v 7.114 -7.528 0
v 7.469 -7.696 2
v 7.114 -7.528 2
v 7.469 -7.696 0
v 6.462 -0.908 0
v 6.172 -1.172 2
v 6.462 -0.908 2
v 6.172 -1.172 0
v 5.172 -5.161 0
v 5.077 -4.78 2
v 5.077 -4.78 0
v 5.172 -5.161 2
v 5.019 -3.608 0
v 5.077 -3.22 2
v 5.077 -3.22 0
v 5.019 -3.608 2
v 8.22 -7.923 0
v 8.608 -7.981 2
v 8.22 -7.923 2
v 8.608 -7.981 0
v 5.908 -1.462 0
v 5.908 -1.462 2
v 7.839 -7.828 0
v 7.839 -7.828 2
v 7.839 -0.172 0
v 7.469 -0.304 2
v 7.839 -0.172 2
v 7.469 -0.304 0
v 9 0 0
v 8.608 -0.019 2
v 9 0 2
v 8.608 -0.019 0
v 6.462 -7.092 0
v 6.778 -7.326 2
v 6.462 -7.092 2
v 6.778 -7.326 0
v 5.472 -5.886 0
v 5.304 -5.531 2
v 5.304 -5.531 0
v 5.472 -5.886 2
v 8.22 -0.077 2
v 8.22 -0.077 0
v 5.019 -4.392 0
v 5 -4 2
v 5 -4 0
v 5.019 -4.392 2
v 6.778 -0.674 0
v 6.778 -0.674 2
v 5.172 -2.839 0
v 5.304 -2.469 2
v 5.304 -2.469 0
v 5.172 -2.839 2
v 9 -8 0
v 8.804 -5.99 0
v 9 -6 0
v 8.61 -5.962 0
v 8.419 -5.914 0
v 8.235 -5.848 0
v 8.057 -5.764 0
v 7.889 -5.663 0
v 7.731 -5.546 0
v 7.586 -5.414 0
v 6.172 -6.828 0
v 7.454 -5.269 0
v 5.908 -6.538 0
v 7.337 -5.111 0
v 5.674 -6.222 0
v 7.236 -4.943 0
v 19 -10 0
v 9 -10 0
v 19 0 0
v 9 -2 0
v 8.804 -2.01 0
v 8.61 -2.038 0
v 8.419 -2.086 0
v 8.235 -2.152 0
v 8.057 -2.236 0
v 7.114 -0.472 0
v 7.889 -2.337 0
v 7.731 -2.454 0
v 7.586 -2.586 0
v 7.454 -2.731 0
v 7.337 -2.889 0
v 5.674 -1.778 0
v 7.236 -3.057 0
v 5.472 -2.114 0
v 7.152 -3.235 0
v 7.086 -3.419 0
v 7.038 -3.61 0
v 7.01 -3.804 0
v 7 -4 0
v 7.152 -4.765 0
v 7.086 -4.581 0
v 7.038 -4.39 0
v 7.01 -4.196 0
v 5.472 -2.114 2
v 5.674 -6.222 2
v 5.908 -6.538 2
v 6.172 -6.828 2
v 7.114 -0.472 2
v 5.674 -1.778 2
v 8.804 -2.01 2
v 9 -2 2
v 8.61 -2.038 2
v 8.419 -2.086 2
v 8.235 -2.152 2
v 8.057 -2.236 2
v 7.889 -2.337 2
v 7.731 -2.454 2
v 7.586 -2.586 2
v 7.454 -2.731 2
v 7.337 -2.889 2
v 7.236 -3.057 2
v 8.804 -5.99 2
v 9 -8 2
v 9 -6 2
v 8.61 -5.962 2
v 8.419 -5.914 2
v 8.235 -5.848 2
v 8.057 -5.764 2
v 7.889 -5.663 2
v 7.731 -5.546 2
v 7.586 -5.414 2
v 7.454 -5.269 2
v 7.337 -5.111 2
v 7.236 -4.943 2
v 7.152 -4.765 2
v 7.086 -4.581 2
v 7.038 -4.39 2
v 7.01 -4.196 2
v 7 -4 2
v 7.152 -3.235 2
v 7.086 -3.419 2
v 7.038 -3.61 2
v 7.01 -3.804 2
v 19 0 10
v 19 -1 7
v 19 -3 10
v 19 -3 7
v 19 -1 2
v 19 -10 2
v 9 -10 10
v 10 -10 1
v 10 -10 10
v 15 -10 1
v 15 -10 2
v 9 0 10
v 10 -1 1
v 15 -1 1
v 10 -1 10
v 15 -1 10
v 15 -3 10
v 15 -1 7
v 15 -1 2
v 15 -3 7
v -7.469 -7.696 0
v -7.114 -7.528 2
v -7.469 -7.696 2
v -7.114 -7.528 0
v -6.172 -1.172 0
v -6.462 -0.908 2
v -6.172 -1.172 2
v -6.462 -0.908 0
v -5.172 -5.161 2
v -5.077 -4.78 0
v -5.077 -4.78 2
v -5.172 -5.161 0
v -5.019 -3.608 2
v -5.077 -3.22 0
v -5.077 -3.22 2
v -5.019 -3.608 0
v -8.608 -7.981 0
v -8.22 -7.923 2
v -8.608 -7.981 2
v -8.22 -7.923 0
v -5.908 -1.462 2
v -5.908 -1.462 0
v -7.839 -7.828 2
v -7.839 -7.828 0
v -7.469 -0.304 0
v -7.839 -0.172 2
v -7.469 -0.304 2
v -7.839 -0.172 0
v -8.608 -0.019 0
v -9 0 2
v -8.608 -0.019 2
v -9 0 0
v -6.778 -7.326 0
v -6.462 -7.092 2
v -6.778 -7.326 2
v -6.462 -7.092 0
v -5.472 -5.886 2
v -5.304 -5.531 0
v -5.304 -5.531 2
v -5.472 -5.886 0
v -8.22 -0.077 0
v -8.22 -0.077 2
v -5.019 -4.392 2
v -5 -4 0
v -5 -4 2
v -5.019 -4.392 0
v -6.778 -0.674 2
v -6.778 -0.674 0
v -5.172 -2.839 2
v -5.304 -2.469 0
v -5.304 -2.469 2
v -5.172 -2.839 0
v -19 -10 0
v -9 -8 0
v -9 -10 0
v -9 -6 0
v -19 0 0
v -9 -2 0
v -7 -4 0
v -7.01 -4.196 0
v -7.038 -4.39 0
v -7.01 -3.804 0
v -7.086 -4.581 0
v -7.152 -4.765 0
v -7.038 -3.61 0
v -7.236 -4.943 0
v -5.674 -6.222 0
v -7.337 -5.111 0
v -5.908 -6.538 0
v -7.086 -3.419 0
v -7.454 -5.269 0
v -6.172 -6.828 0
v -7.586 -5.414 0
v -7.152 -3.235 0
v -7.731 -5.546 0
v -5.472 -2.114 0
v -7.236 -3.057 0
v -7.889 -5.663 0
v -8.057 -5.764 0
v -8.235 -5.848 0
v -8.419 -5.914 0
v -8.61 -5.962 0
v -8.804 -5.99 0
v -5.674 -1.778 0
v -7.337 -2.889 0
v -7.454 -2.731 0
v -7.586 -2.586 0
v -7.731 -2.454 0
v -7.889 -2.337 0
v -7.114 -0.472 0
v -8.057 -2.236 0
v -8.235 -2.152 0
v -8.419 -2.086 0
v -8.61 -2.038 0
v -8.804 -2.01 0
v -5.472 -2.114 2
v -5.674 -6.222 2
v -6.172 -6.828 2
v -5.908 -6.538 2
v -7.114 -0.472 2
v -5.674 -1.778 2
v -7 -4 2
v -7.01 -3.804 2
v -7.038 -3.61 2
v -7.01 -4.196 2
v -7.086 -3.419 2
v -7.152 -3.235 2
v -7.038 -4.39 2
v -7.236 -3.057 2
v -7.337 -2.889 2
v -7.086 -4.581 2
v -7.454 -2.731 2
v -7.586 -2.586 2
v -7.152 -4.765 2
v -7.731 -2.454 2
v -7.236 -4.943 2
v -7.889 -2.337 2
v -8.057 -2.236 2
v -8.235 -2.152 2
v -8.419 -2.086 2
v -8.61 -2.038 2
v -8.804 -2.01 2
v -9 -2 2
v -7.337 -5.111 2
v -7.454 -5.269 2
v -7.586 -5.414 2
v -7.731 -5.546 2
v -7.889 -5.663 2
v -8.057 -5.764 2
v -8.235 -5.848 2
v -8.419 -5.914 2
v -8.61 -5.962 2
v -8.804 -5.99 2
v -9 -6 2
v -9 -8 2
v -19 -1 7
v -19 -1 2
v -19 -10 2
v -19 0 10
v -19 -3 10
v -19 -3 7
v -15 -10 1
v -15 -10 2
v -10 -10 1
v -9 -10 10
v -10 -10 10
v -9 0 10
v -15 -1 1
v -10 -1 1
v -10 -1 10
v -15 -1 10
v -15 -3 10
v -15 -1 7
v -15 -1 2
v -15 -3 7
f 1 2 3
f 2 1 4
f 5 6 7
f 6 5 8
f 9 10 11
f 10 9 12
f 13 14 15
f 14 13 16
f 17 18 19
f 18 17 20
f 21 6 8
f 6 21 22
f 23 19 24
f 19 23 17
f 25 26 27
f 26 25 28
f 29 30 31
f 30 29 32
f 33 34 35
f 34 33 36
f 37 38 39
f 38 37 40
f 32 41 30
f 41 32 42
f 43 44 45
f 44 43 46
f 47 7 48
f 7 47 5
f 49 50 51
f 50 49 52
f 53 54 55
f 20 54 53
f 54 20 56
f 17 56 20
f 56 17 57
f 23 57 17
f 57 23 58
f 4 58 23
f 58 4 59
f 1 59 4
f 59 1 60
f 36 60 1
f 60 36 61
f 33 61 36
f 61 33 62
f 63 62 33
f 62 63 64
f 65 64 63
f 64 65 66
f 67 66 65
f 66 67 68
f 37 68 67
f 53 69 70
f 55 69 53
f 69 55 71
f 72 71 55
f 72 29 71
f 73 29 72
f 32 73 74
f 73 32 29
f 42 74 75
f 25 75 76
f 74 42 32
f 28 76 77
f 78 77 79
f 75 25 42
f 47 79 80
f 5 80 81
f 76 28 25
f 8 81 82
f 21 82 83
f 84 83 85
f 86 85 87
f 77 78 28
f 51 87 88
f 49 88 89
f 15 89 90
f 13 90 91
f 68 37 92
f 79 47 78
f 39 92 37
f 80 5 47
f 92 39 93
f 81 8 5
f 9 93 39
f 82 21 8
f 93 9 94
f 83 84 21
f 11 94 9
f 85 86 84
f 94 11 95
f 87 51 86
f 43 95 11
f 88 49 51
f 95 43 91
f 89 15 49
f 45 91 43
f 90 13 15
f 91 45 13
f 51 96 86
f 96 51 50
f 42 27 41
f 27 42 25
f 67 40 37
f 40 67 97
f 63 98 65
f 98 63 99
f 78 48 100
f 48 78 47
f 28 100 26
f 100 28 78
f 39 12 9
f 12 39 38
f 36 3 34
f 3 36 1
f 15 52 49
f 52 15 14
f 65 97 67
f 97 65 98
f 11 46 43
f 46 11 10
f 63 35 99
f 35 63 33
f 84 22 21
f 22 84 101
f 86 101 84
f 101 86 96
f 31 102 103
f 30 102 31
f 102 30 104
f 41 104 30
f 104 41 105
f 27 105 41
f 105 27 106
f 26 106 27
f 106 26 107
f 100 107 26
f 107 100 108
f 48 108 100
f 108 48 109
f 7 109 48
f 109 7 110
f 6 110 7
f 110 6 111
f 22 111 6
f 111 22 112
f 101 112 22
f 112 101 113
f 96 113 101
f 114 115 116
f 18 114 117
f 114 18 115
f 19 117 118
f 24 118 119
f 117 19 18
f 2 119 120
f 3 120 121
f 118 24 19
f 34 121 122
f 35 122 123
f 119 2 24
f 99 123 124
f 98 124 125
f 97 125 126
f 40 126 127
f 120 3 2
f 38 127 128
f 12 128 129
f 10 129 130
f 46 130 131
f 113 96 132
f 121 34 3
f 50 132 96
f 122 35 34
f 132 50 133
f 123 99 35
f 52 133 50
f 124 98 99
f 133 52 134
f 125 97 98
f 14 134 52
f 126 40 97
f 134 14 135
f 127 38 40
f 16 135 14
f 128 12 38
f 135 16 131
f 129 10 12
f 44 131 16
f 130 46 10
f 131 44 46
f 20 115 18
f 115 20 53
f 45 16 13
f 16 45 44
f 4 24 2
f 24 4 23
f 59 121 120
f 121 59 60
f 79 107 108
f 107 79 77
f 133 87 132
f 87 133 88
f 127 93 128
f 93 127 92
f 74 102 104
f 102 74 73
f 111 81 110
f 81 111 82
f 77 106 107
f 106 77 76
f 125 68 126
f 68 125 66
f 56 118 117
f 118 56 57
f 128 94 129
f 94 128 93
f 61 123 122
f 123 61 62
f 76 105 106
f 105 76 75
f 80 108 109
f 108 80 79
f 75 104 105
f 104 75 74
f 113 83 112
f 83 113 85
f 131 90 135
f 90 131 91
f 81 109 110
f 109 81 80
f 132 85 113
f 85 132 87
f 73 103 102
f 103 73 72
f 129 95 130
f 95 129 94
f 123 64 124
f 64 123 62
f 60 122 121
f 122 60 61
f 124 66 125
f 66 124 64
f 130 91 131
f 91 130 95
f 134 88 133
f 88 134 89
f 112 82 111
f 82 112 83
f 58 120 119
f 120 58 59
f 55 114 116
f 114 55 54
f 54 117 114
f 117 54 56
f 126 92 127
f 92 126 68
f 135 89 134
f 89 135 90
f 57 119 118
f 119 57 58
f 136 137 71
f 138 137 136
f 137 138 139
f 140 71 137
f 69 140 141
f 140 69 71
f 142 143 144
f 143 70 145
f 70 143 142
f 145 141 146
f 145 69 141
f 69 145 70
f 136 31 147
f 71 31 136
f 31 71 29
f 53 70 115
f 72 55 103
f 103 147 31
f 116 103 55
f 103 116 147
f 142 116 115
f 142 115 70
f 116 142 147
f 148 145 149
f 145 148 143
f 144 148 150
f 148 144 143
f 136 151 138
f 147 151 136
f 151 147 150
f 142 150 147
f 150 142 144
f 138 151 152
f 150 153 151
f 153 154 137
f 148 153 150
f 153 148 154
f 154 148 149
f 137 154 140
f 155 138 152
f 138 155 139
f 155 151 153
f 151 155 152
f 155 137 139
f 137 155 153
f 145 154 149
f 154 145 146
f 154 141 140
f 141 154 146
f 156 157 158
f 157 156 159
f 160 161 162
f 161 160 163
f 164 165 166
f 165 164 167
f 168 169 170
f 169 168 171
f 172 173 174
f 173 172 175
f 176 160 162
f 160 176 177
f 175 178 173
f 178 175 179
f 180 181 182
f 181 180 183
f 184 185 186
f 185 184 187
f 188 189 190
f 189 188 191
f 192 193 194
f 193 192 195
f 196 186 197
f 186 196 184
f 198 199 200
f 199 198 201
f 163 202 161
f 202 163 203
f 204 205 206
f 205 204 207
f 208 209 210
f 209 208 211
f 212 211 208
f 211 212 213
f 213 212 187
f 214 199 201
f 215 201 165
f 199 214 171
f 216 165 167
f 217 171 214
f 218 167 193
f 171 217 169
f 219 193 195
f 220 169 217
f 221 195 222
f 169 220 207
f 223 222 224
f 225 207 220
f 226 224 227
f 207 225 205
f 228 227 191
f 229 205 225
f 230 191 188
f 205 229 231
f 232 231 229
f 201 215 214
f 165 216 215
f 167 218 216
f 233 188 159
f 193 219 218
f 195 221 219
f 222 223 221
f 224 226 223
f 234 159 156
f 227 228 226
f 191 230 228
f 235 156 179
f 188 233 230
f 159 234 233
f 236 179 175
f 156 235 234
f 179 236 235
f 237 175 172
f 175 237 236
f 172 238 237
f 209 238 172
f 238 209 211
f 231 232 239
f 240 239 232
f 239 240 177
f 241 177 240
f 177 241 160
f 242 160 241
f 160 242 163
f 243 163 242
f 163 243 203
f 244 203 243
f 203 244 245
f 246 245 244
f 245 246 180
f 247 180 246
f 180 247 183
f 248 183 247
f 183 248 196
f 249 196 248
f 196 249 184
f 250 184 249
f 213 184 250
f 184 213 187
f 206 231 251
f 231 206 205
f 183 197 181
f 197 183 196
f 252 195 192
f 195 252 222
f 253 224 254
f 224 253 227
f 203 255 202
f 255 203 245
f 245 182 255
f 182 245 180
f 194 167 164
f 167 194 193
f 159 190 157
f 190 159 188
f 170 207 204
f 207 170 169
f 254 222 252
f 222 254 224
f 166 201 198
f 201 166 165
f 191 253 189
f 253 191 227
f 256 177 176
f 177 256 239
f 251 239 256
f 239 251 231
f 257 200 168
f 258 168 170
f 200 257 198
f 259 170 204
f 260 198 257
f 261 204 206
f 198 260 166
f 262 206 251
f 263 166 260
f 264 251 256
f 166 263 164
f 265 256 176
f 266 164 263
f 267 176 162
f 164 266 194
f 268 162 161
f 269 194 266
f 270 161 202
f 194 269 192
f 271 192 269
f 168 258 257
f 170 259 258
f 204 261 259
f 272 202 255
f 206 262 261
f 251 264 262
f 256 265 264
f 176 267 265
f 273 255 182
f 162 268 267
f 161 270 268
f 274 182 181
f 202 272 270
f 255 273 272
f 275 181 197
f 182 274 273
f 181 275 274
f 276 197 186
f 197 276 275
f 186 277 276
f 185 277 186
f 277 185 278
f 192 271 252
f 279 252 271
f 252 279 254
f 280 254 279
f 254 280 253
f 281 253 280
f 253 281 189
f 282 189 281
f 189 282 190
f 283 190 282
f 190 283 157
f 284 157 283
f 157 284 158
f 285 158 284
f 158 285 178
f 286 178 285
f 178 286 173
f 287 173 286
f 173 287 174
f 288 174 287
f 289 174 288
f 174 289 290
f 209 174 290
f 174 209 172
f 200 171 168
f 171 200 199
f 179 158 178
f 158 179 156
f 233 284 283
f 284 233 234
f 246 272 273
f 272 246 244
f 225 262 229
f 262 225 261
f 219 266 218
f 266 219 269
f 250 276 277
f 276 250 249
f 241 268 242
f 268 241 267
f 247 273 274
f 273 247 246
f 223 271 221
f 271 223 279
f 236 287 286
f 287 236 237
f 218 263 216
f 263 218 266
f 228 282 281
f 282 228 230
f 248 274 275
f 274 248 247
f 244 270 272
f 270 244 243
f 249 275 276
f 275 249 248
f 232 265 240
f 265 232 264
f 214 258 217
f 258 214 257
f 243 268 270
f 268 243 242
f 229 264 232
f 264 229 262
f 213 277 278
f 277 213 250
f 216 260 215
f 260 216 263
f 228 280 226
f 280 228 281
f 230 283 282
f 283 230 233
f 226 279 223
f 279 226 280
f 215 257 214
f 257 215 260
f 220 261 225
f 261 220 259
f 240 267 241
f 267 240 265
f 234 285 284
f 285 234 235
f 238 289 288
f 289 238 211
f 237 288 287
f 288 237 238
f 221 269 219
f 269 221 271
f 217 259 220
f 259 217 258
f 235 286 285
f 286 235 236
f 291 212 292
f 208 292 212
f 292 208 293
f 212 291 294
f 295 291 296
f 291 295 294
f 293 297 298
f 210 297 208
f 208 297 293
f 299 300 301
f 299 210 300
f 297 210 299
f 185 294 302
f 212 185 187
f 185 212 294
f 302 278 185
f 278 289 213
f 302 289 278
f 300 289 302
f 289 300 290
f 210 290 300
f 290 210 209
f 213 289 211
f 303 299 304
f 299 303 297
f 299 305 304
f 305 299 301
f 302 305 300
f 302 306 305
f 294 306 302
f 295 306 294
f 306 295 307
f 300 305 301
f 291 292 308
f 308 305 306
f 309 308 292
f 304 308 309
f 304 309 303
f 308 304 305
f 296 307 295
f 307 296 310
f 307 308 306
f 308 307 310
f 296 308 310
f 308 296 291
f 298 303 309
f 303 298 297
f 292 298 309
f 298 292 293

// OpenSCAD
// parts to make TwoUp printer gantry level

// bearing to go on M3-6 bolt

// bearing outer radius
bor = 12;
// bearing outer radius at rim
borim = 13;
// bearing inner radius
bir = 2;
// hearing height
bh = 3;
// bearing offset from body of printer
boff = 3;

// upper bearing inside radius
uir = 2;
// upper bearing outer radius at center (lowest part)
uor=2.5;
// upper bearing outer radius at rim
uorim=3.5;
// upper bearing height
uh=5;

thick = 6;
thin = 1;
tall = 10;

hr = 2;
ht = 2;

$fn=64;

module lowerBearing() {
	echo(borim, bor, bh);
	difference() {
		union() {
			cylinder(r1=borim, r2=bor, h=bh/2);
			translate([0,0,bh/2]) 	cylinder(r2=borim, r1=bor, h=bh/2);
			cylinder(r=bir+boff, h=bh+boff);
			}
		translate([0,0,-1]) cylinder(r=bir, h=bh+boff+2);
		}
	echo(hr, ht);
	}

// bearing around nail at top of printer

module upperBearing() {
	echo(uorim, uor, uh);
	difference() {
		union() {
			cylinder(r1=uorim, r2=uor, h=uh/2);
			translate([0,0,uh/2]) 	cylinder(r2=uorim, r1=uor, h=uh/2);
			}
		translate([0,0,-1]) cylinder(r=uir, h=uh+2);
		}
	}

module gantryClip(){
	cube([tall, thin, tall]);
	cube([thin, tall, tall]);
	cube([tall, tall, thin]);
	translate([6,6+1,0]) cube([tall-6,tall-6-1,3]);
	translate([6,0,0]) cube([tall-6,2,tall]);
	translate([0,0,hr+ht]) rotate([-90,0,0]) difference() {
		cylinder(r=hr+ht, h=ht);
		translate([0,0,-1]) cylinder(r=hr, h=ht+2);
		rotate([0,-90,0]) translate([0,0,-ht-hr-1]) cylinder(r=hr+ht+1, h=hr+ht+.5);
		}
	}

module hemiCircle(r, h=1) {
	echo(r, h);
	difference() {
		cylinder(r=r, h=h);
		translate([-r-1, -r-1, -1]) cube([2*r+2,r+1,h+2]);
		}
	}

module gantryBearing() {
	difference() {
		union() {
			translate([0,-26/2,8/2]) difference() {
				cube([54, 26, 8], center=true);
				cube([54-2, 26+2, 6], center=true);
				translate([0,0,-2]) cube([52-2, 26+2, 6], center=true);
				}
			hemiCircle(27,8);
			translate([-27, 0,0]) cube([6,26+5,8]);
			translate([-10, 0,0]) cube([20,26+5,8]);
			translate([21, 0,0]) cube([6,26+5,8]);
			}
		translate([0,-.1,-1]) hemiCircle(20,10);
		translate([0,-.1,1]) hemiCircle(26,6);
		translate([0,-.1,-1]) hemiCircle(25,3);
		translate([0,0,-1]) cylinder(r=5, h=12);
		translate([0,27+1,8-1]) rotate([0,90,0]) cylinder(r=uir, h=55, center=true);
		}
	}

//translate([65,0,8]) rotate([0,180,0]) gantryBearing();
//translate([65+55,0,8]) rotate([0,180,0]) gantryBearing();
//
//translate([borim+5, borim+5,0]) lowerBearing();
//translate([-(borim+5), borim+5,0]) lowerBearing();
translate([hr+ht+5,0,0]) rotate([90,0,0]) gantryClip();
mirror([1,0,0]) translate([hr+ht+5,0,0]) rotate([90,0,0]) gantryClip();

//translate([65,10,0]) upperBearing();
//translate([65+55,10,0]) upperBearing();
